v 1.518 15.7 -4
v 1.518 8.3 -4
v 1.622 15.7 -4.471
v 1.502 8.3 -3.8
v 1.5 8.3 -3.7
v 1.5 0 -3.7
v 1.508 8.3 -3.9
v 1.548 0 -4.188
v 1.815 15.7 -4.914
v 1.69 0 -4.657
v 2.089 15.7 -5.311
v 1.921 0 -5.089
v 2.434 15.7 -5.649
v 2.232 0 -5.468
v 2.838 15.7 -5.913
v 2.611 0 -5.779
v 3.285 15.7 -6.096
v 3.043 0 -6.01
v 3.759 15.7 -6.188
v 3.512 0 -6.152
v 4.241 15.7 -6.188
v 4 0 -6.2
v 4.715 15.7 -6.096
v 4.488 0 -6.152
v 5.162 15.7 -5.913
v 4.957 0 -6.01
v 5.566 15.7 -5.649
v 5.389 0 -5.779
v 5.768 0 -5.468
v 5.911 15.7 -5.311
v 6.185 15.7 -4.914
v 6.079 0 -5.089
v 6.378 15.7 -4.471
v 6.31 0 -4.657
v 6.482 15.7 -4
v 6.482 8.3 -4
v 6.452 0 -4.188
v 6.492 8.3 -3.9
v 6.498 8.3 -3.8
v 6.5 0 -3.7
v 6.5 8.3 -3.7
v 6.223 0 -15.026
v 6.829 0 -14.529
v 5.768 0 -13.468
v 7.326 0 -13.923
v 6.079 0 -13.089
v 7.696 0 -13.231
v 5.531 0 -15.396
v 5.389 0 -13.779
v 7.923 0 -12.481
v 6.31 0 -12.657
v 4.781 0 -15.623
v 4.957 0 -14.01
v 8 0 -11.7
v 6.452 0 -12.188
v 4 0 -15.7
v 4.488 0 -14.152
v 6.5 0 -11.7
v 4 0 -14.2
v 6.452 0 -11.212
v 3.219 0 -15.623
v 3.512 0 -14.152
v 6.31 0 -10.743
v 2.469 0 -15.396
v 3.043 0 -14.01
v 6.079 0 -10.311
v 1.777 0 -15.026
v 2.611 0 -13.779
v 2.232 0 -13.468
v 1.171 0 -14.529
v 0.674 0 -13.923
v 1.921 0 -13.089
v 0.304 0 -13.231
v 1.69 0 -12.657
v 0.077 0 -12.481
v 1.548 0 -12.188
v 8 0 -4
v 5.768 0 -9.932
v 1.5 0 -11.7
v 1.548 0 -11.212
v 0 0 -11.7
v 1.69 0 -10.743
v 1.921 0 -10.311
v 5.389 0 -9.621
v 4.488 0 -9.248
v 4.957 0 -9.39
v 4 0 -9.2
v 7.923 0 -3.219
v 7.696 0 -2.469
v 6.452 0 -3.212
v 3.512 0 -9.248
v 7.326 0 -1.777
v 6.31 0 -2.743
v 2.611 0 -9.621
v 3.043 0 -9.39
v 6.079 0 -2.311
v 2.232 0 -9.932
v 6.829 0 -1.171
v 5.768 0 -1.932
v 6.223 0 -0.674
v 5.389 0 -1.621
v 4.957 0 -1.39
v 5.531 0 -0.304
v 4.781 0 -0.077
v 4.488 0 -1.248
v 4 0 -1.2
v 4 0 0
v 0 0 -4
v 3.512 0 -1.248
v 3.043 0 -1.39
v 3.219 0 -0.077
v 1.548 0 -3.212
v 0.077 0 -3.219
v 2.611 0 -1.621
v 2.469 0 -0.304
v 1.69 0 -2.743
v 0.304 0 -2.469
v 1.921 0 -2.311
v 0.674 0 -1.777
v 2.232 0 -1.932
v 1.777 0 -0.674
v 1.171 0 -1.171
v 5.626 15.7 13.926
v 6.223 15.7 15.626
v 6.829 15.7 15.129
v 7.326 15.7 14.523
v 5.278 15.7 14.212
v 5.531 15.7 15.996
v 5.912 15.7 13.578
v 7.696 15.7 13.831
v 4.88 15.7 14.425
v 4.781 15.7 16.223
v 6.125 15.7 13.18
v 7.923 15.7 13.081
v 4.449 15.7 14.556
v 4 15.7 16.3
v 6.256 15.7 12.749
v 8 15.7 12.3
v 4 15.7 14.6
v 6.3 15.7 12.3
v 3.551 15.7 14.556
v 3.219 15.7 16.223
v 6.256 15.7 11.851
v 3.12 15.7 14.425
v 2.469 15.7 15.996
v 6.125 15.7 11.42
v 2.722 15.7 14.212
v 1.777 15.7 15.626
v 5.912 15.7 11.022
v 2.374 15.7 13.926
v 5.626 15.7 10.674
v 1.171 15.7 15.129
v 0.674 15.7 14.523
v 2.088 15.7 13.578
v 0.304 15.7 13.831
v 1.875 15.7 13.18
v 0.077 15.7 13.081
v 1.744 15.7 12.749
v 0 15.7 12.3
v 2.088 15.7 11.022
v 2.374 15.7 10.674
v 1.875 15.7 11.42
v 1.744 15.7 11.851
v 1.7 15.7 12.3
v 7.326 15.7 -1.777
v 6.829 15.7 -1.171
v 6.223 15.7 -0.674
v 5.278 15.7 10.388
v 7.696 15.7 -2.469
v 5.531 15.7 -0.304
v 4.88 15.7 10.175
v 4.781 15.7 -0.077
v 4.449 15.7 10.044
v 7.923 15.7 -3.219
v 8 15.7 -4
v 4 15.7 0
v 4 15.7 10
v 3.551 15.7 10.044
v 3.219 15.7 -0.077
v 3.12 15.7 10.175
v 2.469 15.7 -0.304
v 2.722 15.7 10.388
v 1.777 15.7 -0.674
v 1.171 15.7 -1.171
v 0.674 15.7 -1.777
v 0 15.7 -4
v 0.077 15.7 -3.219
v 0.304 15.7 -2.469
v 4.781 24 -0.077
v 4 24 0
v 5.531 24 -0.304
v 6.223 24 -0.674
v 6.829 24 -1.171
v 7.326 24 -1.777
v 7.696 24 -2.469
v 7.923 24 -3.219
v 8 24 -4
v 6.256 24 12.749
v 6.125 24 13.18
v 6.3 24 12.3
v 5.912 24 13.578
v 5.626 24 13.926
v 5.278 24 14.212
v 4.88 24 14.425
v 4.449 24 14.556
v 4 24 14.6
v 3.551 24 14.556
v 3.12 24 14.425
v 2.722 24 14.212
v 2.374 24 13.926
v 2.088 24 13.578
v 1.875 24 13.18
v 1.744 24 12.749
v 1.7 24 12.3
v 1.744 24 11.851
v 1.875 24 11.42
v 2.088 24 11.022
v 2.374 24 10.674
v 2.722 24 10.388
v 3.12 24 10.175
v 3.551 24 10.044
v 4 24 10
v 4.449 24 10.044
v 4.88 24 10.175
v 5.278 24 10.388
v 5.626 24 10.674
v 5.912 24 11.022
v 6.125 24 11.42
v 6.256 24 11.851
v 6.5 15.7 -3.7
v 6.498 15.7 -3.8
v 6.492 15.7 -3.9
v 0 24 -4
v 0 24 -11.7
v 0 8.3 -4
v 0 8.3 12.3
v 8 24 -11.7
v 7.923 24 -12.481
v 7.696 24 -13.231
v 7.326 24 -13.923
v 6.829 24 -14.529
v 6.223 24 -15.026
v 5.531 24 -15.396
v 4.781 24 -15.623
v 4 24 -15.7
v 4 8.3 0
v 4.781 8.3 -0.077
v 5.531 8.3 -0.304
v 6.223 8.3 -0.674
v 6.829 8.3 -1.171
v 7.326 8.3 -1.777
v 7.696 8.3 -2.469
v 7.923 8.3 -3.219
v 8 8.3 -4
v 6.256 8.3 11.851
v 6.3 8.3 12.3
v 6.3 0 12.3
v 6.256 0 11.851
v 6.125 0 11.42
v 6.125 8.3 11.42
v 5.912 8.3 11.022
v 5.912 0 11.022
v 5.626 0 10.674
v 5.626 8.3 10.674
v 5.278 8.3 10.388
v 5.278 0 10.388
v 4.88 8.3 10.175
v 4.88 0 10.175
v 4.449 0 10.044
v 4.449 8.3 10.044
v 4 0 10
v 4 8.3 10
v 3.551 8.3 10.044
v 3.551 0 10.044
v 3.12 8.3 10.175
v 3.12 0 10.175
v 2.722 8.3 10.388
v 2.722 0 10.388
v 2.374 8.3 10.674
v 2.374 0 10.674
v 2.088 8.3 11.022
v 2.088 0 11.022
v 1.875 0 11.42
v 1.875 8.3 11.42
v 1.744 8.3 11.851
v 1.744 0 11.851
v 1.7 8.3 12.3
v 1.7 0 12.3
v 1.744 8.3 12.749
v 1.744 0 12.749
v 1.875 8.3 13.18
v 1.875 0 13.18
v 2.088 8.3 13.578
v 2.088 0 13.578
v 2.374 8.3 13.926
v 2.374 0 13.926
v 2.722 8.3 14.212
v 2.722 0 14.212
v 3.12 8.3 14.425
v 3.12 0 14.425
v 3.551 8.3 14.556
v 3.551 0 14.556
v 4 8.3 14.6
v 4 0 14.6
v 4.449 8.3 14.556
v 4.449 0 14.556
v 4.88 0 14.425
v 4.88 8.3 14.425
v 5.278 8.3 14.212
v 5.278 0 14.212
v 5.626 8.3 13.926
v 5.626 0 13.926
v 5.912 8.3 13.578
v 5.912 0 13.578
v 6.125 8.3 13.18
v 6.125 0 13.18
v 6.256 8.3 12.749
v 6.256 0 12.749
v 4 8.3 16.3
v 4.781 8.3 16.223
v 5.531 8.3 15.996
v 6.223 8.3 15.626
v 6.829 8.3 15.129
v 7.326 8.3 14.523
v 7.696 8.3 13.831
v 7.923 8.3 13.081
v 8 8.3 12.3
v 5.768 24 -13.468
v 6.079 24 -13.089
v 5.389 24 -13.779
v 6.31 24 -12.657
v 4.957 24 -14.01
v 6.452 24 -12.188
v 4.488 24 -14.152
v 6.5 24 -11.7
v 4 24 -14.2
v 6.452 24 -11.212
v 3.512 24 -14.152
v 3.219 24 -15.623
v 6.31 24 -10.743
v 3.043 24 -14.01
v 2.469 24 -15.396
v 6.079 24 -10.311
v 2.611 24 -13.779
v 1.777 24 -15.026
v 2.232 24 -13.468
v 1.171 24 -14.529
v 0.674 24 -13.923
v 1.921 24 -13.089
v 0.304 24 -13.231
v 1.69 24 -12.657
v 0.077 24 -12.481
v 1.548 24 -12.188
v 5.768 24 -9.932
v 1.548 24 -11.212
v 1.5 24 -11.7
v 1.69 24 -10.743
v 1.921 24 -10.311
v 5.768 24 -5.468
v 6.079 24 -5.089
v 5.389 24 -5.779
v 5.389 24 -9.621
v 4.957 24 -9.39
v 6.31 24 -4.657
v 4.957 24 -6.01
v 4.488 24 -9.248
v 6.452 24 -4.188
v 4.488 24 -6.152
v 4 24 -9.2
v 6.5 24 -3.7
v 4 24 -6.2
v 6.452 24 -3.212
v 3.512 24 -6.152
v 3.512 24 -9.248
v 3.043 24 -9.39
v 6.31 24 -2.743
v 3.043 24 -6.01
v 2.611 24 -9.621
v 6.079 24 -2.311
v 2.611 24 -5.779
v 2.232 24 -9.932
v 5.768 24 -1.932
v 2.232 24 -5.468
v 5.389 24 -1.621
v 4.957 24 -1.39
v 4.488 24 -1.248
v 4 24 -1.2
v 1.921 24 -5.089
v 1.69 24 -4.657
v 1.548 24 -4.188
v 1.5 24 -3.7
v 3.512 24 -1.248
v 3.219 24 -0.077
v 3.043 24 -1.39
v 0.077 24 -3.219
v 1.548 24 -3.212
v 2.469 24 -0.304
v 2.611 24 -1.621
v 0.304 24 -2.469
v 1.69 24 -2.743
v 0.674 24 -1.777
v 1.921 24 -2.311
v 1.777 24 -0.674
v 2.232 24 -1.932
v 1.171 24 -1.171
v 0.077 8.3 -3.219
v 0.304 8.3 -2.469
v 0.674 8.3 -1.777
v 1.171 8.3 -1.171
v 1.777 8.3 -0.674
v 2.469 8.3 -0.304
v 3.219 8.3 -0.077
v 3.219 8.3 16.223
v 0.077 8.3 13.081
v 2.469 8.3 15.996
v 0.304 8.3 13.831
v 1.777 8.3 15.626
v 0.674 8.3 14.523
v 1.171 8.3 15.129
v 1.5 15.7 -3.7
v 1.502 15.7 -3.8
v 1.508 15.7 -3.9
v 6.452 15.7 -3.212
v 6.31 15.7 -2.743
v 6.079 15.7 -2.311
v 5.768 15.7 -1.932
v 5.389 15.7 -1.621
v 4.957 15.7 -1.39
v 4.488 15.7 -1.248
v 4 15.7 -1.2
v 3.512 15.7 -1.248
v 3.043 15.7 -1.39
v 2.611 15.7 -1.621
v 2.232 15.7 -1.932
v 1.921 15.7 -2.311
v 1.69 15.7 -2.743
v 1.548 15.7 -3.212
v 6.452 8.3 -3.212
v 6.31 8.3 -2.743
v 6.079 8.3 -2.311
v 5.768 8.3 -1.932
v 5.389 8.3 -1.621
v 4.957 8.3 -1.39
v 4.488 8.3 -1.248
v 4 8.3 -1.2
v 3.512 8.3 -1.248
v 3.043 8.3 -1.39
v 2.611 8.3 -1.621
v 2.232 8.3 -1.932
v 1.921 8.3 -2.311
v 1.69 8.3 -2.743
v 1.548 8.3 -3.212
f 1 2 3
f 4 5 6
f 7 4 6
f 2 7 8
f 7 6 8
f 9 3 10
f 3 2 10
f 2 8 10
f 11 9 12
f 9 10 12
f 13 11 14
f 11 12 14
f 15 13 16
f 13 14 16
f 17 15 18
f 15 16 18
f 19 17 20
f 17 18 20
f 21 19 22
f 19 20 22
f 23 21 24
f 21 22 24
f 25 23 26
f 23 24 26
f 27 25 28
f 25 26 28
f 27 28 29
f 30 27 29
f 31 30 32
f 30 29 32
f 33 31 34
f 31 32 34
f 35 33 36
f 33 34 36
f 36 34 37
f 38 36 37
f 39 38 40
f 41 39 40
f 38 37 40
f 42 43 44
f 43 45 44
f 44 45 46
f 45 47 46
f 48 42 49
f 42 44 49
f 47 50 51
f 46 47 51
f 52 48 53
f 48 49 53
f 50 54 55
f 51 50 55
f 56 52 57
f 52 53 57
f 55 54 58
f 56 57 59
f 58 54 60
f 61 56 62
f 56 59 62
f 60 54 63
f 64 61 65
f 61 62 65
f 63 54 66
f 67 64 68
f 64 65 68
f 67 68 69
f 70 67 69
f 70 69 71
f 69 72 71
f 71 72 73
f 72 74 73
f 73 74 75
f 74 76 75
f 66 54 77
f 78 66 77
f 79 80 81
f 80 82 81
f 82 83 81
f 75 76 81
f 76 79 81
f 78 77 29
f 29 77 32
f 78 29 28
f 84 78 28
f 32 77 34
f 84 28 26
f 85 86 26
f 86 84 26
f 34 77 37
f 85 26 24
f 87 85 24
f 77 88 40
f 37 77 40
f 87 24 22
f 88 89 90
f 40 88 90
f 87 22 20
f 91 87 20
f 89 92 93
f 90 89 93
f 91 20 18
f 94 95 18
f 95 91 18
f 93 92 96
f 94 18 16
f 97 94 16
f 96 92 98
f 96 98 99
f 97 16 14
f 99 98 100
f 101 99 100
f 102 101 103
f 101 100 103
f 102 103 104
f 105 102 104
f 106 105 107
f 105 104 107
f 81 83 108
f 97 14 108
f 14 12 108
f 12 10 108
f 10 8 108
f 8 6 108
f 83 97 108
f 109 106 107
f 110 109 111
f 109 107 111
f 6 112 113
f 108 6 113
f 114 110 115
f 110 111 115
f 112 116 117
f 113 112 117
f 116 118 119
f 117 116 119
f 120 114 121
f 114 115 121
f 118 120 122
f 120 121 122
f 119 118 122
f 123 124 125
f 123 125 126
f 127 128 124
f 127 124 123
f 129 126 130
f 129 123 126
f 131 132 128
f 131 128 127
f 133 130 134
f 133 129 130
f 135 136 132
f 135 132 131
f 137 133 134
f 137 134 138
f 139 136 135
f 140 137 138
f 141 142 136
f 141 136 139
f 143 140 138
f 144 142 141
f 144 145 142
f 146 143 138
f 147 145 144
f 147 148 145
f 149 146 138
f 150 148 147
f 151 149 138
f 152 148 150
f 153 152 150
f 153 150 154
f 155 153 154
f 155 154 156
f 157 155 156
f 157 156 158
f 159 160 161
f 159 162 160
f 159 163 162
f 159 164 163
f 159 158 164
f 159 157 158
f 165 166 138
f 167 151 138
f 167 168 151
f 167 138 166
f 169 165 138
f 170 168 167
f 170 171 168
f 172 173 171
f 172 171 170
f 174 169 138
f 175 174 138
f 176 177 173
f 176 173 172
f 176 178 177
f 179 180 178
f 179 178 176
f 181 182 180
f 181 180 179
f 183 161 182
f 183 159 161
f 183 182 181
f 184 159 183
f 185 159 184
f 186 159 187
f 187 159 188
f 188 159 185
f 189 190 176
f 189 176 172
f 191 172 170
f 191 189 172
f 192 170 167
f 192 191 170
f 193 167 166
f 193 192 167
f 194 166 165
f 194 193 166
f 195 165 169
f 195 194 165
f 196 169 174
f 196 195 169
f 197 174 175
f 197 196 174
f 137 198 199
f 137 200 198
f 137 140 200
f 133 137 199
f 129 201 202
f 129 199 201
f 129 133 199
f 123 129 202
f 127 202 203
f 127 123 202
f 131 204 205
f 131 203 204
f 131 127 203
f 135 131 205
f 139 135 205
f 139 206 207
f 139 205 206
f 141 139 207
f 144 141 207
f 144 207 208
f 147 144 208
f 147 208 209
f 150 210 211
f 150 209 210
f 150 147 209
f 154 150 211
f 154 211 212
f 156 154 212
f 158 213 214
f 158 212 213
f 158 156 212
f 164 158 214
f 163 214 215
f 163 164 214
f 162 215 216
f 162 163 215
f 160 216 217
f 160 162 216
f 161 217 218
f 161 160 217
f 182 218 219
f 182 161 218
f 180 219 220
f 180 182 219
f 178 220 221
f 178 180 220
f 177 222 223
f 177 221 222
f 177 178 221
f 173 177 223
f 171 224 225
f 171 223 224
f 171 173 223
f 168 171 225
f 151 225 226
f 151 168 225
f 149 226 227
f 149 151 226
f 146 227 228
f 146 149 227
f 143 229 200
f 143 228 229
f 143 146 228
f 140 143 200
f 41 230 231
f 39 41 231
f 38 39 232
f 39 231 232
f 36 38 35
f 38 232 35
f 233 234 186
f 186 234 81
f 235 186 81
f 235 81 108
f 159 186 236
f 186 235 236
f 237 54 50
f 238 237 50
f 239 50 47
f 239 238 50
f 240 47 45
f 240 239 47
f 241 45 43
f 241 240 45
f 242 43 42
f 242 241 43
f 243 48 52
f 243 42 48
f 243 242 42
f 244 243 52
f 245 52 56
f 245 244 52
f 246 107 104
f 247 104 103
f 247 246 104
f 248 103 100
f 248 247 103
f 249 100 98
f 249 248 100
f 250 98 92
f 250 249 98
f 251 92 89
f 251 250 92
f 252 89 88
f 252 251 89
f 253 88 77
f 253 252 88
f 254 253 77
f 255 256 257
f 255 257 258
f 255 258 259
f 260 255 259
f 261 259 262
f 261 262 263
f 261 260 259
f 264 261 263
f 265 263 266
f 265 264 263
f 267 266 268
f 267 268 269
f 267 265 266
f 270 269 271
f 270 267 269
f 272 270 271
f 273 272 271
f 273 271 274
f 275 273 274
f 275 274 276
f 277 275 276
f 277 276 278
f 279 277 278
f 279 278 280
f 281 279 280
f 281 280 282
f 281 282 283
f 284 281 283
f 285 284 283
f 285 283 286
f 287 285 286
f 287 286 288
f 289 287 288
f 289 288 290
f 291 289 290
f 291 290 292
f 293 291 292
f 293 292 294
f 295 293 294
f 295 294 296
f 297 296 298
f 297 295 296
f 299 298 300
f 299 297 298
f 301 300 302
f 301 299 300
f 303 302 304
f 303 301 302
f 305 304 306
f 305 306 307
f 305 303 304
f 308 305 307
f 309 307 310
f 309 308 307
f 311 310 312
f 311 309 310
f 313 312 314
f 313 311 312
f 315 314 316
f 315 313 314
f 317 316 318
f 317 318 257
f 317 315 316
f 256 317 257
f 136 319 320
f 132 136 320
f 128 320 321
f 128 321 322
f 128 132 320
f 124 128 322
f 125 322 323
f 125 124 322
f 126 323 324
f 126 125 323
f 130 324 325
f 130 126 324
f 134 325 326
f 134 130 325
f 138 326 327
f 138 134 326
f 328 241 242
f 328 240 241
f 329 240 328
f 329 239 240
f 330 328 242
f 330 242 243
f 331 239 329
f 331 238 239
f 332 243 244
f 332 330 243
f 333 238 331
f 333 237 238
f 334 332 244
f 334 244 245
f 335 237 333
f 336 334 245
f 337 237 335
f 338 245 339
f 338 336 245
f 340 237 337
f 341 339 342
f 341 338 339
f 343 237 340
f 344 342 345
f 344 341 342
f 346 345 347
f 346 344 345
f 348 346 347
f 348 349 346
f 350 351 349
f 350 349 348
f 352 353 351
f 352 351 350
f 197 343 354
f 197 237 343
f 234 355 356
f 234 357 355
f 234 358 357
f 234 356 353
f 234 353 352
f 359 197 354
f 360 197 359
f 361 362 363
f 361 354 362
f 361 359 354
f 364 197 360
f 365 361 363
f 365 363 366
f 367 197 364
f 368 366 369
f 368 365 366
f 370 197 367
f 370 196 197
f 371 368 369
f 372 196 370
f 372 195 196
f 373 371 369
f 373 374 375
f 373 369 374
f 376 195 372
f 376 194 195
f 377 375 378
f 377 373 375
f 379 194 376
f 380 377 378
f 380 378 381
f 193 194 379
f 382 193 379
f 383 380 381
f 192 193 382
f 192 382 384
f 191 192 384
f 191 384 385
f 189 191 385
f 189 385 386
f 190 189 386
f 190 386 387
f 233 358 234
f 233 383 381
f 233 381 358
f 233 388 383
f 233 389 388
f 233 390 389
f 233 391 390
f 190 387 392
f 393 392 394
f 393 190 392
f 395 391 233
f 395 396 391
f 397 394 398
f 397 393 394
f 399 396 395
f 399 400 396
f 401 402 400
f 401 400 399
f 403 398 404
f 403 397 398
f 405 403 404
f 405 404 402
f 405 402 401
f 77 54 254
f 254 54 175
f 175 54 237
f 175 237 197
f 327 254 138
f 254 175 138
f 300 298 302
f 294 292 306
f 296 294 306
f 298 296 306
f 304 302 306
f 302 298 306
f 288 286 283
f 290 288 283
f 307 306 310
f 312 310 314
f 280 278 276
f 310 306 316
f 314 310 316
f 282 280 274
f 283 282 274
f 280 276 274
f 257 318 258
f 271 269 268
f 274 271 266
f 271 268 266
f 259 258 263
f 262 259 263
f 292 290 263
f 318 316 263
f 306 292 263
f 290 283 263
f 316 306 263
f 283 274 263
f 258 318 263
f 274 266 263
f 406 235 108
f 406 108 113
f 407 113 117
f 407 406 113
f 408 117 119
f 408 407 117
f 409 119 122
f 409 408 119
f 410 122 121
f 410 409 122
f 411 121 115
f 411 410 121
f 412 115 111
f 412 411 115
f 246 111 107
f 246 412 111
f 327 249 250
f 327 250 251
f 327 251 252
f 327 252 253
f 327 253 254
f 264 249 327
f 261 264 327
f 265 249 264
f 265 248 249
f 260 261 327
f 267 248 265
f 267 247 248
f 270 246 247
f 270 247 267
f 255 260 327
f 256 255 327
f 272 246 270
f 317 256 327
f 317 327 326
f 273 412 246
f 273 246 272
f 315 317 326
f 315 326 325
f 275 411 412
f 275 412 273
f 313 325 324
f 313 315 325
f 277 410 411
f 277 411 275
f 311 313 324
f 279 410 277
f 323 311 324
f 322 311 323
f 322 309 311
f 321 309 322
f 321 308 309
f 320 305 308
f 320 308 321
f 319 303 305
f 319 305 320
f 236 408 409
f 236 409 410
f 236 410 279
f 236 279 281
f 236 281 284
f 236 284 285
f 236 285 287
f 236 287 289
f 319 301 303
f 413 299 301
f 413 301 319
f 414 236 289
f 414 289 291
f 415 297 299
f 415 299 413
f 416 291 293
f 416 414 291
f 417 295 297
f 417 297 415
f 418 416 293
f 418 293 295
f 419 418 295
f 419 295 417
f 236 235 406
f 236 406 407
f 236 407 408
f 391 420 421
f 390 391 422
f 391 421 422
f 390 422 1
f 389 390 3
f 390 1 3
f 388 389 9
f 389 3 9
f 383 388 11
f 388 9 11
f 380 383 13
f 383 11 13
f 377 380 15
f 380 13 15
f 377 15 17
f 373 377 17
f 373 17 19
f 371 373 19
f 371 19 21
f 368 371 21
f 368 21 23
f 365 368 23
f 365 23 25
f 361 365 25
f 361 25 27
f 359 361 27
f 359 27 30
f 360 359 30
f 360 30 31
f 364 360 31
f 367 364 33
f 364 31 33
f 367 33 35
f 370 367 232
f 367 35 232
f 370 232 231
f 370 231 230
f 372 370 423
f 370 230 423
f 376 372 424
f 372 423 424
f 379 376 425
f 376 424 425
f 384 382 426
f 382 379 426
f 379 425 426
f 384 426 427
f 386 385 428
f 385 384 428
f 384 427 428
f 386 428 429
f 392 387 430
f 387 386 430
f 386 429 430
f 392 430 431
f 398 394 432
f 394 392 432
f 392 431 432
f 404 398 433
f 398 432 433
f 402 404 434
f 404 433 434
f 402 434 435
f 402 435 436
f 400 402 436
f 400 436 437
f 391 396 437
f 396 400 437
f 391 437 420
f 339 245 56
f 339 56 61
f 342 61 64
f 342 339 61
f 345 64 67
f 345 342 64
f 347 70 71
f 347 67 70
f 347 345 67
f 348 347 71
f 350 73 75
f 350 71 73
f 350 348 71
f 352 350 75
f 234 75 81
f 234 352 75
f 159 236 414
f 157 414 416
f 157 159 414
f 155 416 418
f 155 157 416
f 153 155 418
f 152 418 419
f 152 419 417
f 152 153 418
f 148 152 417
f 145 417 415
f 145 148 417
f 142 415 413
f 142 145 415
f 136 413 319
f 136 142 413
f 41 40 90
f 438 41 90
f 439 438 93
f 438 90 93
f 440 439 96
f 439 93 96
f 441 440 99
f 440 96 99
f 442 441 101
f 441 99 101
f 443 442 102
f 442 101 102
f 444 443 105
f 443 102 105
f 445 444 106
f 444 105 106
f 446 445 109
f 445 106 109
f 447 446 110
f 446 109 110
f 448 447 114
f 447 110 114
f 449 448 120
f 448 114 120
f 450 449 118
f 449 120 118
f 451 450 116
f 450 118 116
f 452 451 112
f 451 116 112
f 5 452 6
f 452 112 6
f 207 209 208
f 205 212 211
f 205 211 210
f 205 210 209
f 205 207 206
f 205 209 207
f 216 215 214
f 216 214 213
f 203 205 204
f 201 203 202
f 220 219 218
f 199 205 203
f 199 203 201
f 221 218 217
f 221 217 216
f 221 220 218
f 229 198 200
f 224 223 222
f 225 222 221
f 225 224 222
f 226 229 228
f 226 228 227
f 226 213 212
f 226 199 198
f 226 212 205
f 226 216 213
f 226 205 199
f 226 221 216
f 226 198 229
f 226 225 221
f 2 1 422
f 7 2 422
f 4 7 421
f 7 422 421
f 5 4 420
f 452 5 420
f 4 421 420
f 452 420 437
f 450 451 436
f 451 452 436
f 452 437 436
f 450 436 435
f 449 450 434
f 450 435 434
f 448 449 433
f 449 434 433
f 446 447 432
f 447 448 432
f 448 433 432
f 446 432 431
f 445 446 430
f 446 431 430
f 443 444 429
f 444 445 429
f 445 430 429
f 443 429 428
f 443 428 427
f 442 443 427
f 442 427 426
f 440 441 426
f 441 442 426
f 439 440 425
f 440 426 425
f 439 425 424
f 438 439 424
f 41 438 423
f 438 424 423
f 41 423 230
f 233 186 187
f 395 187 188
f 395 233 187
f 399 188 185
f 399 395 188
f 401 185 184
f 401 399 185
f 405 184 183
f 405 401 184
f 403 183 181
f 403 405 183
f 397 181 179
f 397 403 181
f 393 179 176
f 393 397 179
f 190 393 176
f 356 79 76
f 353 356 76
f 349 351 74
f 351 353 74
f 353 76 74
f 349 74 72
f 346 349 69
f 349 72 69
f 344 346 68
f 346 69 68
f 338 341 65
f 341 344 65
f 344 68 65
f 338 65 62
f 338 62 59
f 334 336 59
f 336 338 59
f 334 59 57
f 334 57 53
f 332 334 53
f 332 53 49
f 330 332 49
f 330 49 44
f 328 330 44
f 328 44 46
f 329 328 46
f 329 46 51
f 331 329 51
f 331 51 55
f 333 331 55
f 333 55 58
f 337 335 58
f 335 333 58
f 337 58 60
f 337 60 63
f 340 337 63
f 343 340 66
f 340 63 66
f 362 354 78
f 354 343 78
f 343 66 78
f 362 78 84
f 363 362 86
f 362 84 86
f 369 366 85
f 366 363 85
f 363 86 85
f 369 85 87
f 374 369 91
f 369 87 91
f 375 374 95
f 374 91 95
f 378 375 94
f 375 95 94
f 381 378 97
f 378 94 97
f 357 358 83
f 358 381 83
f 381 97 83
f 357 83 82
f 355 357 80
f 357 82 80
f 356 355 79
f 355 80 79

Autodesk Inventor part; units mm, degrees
ref_plane "YZ Plane" through (0, 0, 0) normal (1, 0, 0) x (0, 1, 0)
ref_plane "XZ Plane" through (0, 0, 0) normal (0, 1, 0) x (-1, 0, 0)
ref_plane "XY Plane" through (0, 0, 0) normal (0, 0, 1) x (1, 0, 0)
sketch "Sketch1" plane through (0, 0, 0) normal (0, 1, 0) x (-1, 0, 0)
  line L0 (0, 0) -> (-8, 0)
  line L1 (-8, 0) -> (-8, -15.7)
  line L2 (-8, -15.7) -> (0, -15.7)
  line L3 (0, -15.7) -> (0, 0)
  circle A0 centre (-4, -3.7) radius 2.5
  circle A1 centre (-4, -11.7) radius 2.5
  dimension "d0" = 8
  dimension "d1" = 15.7
  dimension "d4" = 5
  dimension "d5" = 5
  dimension "d8" = 8
  dimension "d15" = 4
extrude "Extrusion1" add sketch "Sketch1" along normal blind 24
fillet "Fillet1" radius 4 2 edges at (8, 12, 0) (0, 12, 0)
fillet "Fillet2" radius 4 2 edges at (8, 12, -15.7) (0, 12, -15.7)
sketch "Sketch2" plane through (0, 0, -4) normal (-1, 0, 0) x (0, 0, 1)
  line L0 (0, 8.3) -> (20.3, 8.3)
  line L1 (20.3, 8.3) -> (20.3, 15.7)
  line L2 (20.3, 15.7) -> (0, 15.7)
  line L3 (0, 15.7) -> (0, 8.3)
  line L4 (0, 24) -> (4, 24) projected
  line L5 (0, 24) -> (0, 0) projected
  point P0 (4, 0)
  dimension "d17" = 20.3
  dimension "d18" = 7.4
  dimension "d19" = 8.3
extrude "Extrusion2" add sketch "Sketch2" against normal blind 8
sketch "Sketch4" plane through (0, 15.7, 16.3) normal (0, 1, 0) x (1, 0, 0)
  circle A0 centre (4, 4) radius 2.3
  line L0 (8, 20.3) -> (8, 0) projected
  line L1 (0, 0) -> (8, 0) projected
  point P0 (0, 16.3)
  point P1 (8, 12)
  dimension "d24" = 4.6
  dimension "d25" = 4
  dimension "d26" = 4
extrude "Extrusion4" add sketch "Sketch4" along normal blind 8.3 and the other way blind 15.7
fillet "Fillet3" radius 4 2 edges at (0, 12, 16.3) (8, 12, 16.3)
sketch "Sketch5" plane through (4, 15.7, -3.7) normal (0, 1, 0) x (1, 0, 0)
  circle A0 centre (0, 0) radius 2.5 projected
  point P0 (-4, -3.7)
extrude "Extrusion5" cut sketch "Sketch5" against normal through all
properties part number "Crank0"
